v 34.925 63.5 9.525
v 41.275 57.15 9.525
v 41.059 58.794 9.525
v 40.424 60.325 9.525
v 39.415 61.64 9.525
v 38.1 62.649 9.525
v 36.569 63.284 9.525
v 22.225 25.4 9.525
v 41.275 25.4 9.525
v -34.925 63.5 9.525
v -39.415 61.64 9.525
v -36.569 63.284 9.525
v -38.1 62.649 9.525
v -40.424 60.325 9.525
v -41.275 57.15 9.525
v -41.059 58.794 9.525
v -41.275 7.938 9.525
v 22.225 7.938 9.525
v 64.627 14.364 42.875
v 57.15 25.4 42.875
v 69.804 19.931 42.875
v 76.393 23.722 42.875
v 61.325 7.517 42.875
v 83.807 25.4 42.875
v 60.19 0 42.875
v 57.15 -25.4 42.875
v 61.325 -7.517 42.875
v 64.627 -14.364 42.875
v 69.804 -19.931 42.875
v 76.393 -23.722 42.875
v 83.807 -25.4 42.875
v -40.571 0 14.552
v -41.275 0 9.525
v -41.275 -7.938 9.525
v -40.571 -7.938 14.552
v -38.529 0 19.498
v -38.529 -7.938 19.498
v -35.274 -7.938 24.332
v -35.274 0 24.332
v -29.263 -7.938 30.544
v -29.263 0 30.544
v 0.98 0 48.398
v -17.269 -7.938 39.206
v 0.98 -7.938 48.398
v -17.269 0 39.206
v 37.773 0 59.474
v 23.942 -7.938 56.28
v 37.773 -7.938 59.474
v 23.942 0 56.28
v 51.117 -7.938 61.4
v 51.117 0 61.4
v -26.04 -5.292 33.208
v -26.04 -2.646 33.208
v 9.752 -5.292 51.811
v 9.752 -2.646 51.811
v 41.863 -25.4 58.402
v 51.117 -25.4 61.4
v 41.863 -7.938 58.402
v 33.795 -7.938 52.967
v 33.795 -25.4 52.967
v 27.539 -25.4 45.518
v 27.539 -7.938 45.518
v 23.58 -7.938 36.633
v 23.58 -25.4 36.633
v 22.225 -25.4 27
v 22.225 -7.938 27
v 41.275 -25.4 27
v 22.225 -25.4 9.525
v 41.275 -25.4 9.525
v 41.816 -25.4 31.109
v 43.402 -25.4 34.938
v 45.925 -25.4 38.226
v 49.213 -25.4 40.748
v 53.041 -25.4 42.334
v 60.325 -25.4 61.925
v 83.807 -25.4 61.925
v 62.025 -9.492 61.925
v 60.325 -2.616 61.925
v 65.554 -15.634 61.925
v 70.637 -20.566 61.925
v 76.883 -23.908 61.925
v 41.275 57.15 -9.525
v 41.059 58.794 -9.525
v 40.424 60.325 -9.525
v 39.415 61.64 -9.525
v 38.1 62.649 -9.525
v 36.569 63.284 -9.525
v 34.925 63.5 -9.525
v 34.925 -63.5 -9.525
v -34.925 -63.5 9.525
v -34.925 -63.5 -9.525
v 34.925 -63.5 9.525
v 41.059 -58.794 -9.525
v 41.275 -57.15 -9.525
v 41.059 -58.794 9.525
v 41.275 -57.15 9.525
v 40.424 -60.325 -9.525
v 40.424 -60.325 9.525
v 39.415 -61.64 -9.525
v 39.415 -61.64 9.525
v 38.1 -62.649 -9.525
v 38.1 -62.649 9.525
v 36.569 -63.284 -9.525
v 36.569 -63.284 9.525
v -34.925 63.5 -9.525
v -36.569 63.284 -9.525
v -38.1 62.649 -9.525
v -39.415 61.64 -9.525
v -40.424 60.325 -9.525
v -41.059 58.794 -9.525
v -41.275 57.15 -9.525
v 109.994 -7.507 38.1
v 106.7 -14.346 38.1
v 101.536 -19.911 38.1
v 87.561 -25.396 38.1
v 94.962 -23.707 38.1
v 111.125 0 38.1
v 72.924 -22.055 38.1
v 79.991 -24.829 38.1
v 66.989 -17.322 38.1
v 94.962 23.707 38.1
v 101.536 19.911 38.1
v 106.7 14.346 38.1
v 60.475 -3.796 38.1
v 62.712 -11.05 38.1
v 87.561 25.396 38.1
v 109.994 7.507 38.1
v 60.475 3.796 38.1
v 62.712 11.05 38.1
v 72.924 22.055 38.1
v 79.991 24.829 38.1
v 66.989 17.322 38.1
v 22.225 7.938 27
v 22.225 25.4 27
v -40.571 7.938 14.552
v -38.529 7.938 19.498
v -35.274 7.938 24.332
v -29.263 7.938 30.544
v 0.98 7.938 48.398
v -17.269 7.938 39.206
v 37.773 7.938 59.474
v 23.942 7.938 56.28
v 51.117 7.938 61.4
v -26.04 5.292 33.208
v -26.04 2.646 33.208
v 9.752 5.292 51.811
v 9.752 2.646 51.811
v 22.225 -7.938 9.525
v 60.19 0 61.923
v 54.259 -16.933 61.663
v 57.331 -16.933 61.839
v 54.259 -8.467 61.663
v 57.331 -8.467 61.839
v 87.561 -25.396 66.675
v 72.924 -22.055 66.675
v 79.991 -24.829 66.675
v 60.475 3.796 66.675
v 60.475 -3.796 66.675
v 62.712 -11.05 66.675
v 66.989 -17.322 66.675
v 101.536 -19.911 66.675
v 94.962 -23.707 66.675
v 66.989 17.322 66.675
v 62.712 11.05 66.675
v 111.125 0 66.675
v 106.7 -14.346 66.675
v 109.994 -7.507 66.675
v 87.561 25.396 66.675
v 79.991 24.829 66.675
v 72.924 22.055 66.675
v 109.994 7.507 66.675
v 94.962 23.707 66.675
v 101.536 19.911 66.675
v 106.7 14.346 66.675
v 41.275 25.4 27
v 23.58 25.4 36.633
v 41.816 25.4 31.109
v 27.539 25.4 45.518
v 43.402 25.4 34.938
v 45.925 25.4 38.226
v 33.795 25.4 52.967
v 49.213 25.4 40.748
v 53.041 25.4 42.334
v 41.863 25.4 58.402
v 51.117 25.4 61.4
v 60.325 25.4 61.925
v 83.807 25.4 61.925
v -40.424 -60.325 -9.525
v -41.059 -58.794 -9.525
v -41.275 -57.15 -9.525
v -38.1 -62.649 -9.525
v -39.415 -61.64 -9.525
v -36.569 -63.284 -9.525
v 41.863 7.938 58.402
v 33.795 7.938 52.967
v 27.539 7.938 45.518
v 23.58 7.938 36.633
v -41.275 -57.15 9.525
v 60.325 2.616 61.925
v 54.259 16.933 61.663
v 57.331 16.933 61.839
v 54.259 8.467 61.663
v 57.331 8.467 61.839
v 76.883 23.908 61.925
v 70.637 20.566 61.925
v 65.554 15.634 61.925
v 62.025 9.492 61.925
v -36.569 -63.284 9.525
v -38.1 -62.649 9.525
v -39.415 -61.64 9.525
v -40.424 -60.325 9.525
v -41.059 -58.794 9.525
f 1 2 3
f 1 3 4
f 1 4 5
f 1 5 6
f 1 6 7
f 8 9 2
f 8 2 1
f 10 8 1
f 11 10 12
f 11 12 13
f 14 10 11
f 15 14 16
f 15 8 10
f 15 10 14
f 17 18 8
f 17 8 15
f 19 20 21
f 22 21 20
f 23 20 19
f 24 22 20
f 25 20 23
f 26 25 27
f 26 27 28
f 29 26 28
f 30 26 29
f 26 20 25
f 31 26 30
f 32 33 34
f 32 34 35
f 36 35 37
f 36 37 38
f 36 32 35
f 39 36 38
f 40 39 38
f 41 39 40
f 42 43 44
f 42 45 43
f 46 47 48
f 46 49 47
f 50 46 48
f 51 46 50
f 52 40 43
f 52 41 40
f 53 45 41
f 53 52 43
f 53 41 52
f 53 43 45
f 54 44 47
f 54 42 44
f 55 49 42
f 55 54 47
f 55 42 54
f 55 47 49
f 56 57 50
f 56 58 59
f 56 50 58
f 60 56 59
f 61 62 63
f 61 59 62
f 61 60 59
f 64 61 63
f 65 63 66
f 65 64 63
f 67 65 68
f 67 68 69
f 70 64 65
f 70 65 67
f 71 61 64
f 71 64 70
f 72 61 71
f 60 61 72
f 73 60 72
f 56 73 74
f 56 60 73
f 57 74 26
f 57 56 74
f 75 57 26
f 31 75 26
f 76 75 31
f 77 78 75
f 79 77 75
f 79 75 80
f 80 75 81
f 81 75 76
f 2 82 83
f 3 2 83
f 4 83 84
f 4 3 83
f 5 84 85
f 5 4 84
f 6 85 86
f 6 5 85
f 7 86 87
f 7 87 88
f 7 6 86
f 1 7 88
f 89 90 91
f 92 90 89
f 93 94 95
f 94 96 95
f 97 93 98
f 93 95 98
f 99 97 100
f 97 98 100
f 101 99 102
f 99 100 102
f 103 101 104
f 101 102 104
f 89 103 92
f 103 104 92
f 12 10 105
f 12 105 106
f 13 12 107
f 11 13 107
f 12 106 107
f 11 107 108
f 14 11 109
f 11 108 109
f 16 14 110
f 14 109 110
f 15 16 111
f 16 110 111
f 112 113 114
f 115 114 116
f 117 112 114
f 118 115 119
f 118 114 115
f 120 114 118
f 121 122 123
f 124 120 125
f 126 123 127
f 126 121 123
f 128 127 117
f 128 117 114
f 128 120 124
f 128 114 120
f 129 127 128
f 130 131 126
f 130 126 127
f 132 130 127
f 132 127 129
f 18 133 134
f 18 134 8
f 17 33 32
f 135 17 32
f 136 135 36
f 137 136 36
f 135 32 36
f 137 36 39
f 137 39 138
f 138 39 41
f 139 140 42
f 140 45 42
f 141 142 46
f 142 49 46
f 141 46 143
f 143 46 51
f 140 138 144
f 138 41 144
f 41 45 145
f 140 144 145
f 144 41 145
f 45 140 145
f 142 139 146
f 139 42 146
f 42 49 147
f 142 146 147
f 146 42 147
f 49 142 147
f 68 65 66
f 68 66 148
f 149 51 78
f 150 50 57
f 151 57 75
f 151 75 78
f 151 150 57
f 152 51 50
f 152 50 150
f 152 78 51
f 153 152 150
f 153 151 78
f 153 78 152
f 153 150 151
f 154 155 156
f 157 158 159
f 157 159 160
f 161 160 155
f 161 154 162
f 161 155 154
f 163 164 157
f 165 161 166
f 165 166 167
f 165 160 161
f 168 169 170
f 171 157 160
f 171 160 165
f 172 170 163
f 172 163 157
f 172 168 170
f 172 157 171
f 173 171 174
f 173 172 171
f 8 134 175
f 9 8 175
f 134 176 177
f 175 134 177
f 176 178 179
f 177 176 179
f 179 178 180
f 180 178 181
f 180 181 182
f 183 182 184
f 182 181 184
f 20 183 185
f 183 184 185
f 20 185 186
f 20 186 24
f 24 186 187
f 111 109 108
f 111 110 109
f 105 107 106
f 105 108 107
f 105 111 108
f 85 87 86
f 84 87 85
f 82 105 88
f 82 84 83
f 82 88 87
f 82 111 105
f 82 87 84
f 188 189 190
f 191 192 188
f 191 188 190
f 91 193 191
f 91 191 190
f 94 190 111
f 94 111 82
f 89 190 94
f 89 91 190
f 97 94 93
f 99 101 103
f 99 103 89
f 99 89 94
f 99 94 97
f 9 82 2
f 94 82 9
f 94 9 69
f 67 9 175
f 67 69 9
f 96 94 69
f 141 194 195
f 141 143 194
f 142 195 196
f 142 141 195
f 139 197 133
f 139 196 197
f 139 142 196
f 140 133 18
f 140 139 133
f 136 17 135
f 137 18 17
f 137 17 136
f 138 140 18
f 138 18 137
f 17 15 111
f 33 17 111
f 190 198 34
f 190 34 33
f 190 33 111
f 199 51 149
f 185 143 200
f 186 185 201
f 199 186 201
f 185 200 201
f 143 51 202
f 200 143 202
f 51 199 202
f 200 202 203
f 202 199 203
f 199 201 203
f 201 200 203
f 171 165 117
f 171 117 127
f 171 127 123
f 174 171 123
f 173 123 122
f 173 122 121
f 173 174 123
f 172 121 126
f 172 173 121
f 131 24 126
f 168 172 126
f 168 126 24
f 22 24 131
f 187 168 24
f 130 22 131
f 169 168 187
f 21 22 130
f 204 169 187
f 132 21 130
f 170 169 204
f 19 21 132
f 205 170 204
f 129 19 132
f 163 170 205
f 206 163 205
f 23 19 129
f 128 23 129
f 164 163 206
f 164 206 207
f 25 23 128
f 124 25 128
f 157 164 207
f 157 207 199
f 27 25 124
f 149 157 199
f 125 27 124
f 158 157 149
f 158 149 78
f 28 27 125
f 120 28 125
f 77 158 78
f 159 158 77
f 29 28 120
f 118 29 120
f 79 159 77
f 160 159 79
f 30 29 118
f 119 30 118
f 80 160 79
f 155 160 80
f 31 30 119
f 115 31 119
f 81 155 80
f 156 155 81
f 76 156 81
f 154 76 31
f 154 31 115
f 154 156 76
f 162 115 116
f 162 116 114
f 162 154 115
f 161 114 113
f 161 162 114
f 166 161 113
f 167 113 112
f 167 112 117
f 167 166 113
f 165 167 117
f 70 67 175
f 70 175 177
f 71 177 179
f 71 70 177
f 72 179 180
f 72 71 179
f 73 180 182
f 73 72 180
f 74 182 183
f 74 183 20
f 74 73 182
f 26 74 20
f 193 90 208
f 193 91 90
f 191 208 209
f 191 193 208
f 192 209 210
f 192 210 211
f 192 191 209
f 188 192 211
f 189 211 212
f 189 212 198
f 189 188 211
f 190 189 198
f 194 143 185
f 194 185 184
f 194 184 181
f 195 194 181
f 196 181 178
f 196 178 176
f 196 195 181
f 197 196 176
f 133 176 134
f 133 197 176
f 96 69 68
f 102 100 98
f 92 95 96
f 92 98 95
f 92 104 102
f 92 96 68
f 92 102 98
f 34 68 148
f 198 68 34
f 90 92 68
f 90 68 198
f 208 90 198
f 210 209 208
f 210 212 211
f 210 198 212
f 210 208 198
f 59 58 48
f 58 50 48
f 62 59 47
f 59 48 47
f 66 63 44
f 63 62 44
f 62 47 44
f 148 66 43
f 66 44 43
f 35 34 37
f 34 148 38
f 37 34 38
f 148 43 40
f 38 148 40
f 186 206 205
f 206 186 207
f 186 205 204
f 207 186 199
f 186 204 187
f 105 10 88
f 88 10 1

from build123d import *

# Parameters (mm, degrees)
F1_DEPTH = 63.5
F0_W     = 25.332664
F0_H     = 19.05
F2_DEPTH = 25.4
F3_DEPTH = 7.9375
F5_R     = 6.35


with BuildPart() as f1:
    # F0 (on Front) → F1 (new body, symmetric)
    with BuildSketch(Plane.XZ):
        Polygon((-41.275, 9.525), (-41.275, -9.525), (41.275, -9.525), (41.275, 9.525), (22.225, 9.525), align=None)
    extrude(amount=F1_DEPTH, both=True)

    # F0 (on Front) → F2 (join, symmetric)
    with BuildSketch(Plane.XZ):
        with BuildLine():
            Line((22.225, 9.525), (41.275, 9.525))
            Line((41.275, 9.525), (41.275, 27.0002))
            ThreePointArc((41.275, 27.0002), (45.92468, 38.22552), (57.15, 42.8752))
            Line((57.15, 42.8752), (60.325, 42.8752))
            Line((60.325, 42.8752), (60.325, 61.9252))
            add(Edge.make_bspline(
                [(51.116651, 61.400117), (54.290802, 61.705885), (57.372222, 61.884054), (60.325, 61.9252)],
                knots=[105.745107, 105.745107, 105.745107, 105.745107, 114.316845, 114.316845, 114.316845, 114.316845], degree=3))
            ThreePointArc((51.116651, 61.400117), (30.406119, 49.461733), (22.225, 27.0002))
            Line((22.225, 27.0002), (22.225, 9.525))
        make_face()
        with Locations((72.991332, 52.4002)):
            Rectangle(F0_W, F0_H)
    extrude(amount=F2_DEPTH, both=True)

    # F0 (on Front) → F3 (join, symmetric)
    with BuildSketch(Plane.XZ):
        with BuildLine():
            add(Edge.make_bspline(
                [(-41.275, 9.525), (-41.311846, 34.437038), (11.958779, 57.628027), (51.116651, 61.400117)],
                knots=[0, 0, 0, 0, 105.745107, 105.745107, 105.745107, 105.745107], degree=3))
            Line((-41.275, 9.525), (22.225, 9.525))
            Line((22.225, 9.525), (22.225, 27.0002))
            ThreePointArc((22.225, 27.0002), (30.406119, 49.461733), (51.116651, 61.400117))
        make_face()
    extrude(amount=F3_DEPTH, both=True)

    # F0 (on Front) → F4 (revolve)
    with BuildSketch(Plane.XZ):
        Polygon((85.657664, 66.675), (85.657664, 61.9252), (85.657664, 42.8752), (85.657664, 38.1), (111.125, 38.1), (111.125, 66.675), align=None)
    revolve(axis=Axis((85.657664, 0, 52.3875), (0, 0, 1)))

    # F5
    f5_edges = [f1.edges().sort_by_distance(p)[0] for p in [
        (-41.275, -63.5, 0),
        (41.275, -63.5, 0),
        (41.275, 63.5, 0),
        (-41.275, 63.5, 0),
    ]]
    fillet(f5_edges, radius=F5_R)


solid = f1.part
